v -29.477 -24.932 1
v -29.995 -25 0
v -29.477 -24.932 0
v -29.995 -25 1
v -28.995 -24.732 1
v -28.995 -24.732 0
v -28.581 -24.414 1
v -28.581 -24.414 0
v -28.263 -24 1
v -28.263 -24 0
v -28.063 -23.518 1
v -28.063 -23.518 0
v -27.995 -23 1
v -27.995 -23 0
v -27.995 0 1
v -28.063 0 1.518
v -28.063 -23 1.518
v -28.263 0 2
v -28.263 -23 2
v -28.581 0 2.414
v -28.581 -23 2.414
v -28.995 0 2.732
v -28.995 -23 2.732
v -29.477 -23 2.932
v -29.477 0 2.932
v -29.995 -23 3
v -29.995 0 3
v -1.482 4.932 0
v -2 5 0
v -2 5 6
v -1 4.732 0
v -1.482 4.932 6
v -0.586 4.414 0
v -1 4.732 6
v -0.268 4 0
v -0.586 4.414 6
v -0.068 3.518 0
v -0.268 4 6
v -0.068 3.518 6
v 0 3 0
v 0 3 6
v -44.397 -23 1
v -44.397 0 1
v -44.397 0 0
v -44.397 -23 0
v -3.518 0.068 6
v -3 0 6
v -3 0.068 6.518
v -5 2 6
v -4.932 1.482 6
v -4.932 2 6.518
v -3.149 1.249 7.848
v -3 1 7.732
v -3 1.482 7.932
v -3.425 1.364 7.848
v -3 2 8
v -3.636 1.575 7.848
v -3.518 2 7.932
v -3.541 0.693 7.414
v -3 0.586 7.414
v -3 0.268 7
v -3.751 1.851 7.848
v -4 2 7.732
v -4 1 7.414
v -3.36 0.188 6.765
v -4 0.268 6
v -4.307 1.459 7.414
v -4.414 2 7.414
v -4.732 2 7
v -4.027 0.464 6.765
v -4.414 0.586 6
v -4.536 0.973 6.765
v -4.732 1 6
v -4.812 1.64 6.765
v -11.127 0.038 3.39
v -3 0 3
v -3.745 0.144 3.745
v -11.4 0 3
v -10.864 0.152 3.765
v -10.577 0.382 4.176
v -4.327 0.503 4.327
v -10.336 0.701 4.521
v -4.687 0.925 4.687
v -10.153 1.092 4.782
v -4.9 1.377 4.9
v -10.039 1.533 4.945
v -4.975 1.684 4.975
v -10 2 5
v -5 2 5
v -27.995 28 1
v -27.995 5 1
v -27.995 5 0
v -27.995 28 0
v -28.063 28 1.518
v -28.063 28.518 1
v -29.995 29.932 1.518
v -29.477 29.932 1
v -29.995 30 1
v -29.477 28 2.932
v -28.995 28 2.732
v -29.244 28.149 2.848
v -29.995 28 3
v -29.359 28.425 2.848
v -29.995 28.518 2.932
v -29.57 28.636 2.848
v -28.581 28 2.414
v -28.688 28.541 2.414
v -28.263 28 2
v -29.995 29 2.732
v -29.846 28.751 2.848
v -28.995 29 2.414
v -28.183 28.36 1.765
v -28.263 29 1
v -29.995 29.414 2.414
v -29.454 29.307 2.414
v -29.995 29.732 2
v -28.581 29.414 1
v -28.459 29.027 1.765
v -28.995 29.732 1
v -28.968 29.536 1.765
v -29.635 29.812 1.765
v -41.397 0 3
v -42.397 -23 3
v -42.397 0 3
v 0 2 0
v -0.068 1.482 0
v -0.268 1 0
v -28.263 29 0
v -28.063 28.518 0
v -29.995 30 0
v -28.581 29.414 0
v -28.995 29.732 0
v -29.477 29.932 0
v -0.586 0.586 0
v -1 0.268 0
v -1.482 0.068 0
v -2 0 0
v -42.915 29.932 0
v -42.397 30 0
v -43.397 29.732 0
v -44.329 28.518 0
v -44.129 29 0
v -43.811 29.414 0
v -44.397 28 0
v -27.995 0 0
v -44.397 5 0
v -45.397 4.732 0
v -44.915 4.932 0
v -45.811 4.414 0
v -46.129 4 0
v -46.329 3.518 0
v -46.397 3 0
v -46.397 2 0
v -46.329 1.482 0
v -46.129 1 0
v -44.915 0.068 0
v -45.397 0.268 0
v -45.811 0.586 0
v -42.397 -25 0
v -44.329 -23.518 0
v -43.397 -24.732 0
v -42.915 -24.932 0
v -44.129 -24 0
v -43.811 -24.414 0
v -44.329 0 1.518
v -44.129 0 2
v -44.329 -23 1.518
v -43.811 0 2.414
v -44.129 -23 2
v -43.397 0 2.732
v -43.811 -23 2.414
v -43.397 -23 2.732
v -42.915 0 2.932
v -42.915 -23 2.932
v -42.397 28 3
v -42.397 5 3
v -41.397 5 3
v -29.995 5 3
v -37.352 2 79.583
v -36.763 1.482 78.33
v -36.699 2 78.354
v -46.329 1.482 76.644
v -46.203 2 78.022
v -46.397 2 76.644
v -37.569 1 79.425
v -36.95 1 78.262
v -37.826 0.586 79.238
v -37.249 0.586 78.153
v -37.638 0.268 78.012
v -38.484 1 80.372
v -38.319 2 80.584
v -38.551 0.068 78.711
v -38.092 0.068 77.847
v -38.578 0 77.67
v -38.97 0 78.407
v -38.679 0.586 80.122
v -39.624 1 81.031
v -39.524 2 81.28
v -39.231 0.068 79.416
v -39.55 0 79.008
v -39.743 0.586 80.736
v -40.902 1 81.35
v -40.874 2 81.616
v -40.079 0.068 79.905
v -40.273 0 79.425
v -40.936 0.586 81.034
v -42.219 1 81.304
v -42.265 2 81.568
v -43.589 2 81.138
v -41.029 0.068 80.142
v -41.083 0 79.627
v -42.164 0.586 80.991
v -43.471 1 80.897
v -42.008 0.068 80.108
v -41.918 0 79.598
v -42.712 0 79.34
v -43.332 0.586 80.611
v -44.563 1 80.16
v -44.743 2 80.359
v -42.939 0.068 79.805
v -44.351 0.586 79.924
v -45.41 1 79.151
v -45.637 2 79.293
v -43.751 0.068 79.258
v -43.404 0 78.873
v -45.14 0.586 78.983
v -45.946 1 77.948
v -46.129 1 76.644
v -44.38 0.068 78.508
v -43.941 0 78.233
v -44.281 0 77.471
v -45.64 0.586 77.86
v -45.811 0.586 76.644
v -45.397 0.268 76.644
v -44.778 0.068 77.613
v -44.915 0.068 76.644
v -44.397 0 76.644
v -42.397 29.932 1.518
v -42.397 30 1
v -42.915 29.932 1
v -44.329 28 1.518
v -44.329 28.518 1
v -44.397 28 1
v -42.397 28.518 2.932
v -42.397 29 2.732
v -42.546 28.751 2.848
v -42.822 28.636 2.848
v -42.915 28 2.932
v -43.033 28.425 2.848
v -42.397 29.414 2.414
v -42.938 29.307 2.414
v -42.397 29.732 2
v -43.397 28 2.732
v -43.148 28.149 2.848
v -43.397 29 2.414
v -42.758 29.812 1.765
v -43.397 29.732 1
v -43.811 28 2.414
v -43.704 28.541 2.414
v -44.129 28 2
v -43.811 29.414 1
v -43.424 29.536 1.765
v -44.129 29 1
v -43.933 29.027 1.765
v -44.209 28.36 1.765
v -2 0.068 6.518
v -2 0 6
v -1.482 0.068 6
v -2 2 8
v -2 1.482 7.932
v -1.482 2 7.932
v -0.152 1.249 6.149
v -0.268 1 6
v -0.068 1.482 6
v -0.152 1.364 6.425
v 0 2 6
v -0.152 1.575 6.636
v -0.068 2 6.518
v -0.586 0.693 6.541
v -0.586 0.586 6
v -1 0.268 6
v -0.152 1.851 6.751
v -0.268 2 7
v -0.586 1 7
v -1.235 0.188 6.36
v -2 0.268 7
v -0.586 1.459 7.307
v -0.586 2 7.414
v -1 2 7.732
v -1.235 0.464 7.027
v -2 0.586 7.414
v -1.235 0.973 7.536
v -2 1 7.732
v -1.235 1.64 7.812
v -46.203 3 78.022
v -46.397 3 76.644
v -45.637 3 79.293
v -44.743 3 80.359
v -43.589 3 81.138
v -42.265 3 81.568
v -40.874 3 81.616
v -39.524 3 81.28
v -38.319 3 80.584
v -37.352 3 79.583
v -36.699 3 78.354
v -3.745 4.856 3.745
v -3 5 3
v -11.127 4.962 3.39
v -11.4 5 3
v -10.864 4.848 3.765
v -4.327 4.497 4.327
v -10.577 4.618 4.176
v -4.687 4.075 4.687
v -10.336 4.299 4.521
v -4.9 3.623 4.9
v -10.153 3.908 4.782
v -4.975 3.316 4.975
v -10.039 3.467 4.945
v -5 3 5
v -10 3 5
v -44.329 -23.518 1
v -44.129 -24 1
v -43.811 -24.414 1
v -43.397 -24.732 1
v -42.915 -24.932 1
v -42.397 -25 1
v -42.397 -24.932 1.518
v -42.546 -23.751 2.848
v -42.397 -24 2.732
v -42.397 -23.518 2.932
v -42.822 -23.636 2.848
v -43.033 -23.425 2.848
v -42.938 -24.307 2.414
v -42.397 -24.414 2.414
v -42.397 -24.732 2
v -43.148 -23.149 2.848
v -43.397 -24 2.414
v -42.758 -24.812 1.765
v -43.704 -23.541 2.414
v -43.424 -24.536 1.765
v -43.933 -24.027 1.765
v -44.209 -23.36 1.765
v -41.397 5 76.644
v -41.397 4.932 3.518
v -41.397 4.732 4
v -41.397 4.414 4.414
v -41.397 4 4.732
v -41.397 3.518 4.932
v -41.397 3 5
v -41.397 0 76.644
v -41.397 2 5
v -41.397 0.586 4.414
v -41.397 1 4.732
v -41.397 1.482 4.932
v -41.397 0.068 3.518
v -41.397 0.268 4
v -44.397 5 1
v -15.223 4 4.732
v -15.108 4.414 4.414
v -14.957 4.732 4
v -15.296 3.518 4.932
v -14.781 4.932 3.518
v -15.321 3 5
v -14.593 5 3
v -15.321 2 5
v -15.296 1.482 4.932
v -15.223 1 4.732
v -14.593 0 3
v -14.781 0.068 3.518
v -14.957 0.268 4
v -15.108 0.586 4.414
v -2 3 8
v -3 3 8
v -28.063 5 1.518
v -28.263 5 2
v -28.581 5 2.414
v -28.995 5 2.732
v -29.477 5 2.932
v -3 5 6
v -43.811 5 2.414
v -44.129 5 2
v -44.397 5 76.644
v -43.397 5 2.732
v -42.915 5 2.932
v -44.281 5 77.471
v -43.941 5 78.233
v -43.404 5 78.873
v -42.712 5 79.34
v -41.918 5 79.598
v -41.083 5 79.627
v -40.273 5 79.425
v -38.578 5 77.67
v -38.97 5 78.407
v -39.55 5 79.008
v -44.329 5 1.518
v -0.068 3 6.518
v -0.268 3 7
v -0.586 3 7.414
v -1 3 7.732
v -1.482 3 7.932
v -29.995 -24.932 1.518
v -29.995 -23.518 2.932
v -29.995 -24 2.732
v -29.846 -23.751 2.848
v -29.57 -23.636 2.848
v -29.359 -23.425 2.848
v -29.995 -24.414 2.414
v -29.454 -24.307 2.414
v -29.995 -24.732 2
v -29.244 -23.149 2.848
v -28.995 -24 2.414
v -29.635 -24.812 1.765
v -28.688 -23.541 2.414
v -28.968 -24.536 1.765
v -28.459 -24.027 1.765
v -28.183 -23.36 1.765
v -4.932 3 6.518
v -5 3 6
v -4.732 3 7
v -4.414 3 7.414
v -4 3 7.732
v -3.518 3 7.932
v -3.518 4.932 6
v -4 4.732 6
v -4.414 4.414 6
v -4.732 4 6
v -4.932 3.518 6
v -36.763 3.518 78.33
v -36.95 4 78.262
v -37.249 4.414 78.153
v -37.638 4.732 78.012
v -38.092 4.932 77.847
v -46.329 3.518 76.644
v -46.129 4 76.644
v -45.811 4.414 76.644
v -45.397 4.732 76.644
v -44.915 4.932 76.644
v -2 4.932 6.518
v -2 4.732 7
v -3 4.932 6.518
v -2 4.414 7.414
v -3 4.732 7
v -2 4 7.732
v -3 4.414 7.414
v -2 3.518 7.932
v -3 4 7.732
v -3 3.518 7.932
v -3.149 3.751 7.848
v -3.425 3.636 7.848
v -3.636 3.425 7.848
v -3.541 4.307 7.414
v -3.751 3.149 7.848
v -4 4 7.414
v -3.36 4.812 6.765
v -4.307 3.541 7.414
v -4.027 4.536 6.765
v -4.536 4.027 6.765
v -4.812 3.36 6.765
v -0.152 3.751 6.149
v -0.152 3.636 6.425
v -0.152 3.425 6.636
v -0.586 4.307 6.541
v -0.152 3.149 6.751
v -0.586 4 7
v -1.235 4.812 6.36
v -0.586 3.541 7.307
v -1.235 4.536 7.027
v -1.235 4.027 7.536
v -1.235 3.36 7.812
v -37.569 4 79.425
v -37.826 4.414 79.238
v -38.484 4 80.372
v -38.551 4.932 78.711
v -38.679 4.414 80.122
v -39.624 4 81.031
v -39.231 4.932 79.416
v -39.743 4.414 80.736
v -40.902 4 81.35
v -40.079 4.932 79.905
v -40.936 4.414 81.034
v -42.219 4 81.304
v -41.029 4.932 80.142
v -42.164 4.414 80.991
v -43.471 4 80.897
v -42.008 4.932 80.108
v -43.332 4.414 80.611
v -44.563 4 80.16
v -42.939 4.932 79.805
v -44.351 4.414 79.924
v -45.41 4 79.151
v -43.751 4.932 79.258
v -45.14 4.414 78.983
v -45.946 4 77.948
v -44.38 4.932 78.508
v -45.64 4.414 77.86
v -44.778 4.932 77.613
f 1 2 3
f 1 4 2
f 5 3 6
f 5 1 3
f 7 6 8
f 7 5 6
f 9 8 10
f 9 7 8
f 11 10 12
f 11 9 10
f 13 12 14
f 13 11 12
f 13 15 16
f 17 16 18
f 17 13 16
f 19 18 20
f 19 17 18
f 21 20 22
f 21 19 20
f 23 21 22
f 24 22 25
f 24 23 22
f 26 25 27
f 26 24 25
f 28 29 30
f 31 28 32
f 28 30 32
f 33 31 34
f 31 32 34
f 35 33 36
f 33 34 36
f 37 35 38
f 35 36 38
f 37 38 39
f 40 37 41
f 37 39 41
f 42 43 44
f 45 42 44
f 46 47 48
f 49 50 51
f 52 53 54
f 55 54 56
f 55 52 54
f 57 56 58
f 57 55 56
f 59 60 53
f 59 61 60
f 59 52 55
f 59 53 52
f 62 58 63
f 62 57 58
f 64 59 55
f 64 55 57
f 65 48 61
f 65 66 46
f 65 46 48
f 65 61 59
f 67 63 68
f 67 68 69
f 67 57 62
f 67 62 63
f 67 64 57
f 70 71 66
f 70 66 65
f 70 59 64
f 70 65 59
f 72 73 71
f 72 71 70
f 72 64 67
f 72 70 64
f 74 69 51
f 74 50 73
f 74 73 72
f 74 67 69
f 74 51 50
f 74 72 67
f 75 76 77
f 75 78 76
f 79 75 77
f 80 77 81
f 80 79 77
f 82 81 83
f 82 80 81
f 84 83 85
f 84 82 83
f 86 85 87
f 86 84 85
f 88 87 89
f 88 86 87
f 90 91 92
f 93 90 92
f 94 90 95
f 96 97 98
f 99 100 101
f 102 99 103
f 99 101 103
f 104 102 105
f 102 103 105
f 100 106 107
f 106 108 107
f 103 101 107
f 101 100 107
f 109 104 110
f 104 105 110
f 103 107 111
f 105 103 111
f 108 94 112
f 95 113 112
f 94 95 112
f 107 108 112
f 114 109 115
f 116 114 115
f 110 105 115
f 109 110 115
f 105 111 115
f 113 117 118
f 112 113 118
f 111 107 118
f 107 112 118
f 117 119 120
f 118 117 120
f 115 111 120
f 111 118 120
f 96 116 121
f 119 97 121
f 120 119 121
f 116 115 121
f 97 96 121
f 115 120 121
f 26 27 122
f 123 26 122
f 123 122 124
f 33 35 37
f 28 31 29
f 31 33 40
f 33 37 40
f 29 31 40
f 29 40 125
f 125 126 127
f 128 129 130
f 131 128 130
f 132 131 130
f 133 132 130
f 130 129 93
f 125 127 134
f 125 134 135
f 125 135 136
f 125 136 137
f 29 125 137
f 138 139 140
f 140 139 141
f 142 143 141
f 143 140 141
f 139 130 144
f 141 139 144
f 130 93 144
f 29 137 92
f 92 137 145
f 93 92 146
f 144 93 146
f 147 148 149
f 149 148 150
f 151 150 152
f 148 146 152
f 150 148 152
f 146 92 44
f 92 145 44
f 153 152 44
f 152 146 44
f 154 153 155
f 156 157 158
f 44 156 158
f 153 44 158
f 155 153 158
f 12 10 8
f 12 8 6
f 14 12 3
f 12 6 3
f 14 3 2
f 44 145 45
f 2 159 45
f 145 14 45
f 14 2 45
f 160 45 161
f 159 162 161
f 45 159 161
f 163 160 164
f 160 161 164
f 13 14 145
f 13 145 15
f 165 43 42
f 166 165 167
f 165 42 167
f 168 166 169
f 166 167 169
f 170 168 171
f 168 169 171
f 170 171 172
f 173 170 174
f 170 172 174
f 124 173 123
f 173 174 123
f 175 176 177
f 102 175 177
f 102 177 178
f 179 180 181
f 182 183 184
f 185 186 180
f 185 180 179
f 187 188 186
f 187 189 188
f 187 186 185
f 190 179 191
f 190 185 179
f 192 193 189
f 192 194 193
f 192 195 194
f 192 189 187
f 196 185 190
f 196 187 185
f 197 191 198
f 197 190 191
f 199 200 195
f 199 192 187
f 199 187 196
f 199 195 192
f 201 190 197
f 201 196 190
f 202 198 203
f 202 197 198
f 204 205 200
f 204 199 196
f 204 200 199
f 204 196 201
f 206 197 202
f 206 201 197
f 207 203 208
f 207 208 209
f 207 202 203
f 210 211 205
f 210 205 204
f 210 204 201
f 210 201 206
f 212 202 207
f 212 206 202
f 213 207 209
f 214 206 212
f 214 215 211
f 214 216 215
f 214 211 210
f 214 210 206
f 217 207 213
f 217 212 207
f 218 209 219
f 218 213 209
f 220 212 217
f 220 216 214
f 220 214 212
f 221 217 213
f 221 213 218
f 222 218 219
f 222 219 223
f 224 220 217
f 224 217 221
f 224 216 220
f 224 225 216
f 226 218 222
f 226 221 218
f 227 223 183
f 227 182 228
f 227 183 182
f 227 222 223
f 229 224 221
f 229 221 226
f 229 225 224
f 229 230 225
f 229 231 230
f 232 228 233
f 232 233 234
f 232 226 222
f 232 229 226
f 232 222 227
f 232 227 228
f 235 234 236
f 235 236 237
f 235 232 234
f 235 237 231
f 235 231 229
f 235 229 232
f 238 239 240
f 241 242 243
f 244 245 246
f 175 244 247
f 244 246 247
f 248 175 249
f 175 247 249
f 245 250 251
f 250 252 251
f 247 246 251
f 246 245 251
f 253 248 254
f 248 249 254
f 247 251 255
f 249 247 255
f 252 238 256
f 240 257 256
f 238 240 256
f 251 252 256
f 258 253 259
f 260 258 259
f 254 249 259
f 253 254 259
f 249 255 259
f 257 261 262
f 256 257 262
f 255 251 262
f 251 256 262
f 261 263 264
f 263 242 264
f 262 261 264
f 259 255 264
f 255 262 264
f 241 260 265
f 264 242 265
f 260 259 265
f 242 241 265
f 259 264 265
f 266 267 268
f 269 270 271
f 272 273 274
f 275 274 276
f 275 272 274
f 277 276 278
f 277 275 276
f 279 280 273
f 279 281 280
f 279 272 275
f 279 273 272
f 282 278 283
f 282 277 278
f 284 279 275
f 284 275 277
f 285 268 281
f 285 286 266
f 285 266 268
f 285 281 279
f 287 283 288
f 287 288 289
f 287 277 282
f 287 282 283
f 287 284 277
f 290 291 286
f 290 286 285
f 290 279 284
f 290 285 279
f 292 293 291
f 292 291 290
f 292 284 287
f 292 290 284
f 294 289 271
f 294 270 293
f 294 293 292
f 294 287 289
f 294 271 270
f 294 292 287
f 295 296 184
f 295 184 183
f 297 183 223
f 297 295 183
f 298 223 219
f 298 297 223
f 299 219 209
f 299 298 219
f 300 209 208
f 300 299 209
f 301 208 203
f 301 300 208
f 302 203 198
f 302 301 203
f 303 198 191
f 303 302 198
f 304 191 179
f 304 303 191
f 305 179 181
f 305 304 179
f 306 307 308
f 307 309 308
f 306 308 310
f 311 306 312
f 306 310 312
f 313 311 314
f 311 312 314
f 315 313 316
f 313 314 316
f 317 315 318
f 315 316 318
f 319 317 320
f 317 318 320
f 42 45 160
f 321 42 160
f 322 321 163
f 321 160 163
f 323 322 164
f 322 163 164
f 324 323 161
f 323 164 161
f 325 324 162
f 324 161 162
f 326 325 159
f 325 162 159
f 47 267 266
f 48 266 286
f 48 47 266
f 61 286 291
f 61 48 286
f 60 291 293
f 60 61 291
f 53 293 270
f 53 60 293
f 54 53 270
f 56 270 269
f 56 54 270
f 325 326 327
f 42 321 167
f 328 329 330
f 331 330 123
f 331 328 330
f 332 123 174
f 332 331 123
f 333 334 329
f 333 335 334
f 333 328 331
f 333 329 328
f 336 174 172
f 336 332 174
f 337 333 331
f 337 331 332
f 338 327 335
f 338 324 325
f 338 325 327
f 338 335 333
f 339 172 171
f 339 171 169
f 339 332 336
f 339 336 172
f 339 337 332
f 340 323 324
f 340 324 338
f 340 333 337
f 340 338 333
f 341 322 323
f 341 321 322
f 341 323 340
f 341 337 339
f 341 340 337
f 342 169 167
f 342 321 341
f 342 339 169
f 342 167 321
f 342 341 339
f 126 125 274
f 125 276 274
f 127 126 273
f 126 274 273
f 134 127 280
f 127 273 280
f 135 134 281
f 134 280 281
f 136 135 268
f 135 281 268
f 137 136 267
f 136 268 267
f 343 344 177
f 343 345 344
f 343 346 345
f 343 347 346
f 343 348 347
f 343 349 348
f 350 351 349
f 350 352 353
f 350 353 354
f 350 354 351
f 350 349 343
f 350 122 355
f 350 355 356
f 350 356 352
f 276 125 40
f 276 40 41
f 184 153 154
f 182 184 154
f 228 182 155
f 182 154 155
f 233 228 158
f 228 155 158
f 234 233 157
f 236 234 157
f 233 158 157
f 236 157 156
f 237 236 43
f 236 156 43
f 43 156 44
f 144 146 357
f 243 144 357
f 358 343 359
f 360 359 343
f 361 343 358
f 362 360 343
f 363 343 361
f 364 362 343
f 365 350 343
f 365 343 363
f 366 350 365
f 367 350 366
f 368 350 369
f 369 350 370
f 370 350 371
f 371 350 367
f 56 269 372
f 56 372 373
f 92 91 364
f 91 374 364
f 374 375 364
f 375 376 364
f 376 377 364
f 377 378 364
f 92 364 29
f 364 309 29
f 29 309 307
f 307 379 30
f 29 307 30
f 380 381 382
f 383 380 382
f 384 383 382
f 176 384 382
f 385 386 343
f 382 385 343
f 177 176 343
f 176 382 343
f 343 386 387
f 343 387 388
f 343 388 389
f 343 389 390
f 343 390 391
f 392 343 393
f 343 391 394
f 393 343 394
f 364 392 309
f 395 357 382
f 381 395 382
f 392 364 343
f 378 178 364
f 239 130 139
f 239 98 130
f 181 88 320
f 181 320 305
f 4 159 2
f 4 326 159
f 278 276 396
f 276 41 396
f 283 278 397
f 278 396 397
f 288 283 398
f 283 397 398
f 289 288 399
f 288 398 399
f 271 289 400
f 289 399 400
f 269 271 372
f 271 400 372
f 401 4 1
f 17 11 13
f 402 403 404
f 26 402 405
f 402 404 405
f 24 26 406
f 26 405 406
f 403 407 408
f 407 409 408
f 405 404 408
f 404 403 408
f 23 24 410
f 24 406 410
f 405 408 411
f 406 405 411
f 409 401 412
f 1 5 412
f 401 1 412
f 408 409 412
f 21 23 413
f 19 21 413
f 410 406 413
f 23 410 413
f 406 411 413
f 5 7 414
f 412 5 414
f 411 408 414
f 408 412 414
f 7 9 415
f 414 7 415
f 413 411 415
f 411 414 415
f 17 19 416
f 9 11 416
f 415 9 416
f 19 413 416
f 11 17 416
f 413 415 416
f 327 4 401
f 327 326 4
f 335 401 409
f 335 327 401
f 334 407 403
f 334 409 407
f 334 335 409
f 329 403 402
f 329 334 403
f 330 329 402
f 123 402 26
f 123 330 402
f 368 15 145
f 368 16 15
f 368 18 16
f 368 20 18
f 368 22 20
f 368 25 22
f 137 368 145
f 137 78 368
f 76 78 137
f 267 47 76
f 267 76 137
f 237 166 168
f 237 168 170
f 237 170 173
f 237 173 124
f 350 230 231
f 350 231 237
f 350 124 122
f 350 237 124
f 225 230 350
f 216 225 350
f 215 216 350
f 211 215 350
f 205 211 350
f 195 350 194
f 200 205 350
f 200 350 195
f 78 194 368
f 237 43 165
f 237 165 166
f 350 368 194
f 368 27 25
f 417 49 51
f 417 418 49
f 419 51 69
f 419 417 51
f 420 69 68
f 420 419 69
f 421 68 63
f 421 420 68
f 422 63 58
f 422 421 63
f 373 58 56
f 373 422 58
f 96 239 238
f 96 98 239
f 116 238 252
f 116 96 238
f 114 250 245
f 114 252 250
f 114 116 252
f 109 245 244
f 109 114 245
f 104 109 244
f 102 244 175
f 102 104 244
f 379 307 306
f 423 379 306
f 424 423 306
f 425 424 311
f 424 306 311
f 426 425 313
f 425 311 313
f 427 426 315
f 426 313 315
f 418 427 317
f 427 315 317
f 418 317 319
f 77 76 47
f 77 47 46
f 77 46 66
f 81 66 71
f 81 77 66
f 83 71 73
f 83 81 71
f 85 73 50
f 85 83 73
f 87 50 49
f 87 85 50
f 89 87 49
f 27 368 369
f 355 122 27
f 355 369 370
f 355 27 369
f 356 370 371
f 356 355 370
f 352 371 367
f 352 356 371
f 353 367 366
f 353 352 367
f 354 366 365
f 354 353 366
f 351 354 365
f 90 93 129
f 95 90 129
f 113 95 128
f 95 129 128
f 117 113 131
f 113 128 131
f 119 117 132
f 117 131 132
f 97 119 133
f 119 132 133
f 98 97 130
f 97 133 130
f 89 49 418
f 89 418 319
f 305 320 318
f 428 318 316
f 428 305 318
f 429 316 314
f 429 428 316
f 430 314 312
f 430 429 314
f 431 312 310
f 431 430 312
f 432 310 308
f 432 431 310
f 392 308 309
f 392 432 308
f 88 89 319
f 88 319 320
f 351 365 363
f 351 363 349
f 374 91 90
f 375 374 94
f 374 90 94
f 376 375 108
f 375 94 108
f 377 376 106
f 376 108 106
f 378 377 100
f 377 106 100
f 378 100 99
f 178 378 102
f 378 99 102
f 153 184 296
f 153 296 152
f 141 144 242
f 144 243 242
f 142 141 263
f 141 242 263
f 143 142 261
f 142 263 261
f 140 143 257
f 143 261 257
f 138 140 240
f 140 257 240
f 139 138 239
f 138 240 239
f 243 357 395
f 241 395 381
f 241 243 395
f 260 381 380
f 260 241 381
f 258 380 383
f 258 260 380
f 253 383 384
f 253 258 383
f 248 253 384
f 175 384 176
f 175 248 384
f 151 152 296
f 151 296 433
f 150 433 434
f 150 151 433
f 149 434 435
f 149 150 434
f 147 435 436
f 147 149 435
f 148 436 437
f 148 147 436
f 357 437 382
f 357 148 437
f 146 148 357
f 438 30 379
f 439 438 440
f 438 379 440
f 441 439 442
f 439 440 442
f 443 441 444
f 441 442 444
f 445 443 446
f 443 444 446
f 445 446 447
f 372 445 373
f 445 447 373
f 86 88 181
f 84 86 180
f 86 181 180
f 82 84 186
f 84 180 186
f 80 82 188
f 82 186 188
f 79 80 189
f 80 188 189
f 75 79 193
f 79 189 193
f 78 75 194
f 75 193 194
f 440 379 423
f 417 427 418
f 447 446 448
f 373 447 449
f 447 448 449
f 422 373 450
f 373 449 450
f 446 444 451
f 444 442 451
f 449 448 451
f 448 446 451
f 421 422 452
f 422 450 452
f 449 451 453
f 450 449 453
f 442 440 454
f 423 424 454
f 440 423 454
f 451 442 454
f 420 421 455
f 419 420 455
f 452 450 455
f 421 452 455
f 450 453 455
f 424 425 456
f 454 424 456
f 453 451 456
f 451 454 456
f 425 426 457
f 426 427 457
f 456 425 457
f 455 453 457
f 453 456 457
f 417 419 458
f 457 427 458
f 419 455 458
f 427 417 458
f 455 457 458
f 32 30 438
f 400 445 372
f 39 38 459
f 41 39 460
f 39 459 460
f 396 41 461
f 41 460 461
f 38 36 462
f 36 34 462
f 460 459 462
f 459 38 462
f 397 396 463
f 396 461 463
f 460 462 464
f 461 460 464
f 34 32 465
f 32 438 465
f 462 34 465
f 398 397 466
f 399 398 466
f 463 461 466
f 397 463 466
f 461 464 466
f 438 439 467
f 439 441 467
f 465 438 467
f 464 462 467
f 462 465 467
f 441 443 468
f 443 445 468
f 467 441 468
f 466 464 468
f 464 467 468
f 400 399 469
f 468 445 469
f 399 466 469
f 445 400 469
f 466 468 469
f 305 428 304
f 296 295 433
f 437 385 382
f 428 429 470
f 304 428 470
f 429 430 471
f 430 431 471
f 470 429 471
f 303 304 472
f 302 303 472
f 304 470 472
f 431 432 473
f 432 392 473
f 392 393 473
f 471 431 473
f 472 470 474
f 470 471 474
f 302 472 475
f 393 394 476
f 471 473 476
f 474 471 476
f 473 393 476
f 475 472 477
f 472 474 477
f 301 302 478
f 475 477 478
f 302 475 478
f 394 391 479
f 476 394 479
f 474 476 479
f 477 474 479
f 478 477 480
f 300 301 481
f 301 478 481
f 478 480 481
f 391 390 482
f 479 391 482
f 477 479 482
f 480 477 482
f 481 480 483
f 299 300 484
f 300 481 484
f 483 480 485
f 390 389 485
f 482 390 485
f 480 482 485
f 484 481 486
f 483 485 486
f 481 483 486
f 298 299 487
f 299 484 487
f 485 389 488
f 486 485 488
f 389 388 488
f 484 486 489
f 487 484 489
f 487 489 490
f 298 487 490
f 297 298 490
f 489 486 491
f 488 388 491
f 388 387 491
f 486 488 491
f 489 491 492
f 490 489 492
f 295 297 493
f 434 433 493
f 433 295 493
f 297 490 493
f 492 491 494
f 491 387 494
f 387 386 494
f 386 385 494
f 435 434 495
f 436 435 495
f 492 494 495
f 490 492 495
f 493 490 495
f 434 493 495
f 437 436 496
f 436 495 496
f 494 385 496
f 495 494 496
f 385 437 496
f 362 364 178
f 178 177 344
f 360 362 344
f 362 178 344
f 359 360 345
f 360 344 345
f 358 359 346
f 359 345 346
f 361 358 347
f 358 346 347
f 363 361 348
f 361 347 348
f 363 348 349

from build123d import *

# Parameters (mm, degrees)
F1_DEPTH    = 5
F3_W        = 10
F3_H        = 180
F4_DEPTH    = 5.001
F5_T1_DEPTH = 146.7820454904
F6_R        = 2
F11_DEPTH   = 25
F13_DEPTH   = 25
F14_R       = 2


# Not quite as in the source:
# - a fillet or chamfer that OpenCascade refuses, or shapes differently, is made with other operations: its cross-section is extruded or revolved along the edge and cut away or added
# - two fillets or chamfers of one size are made in one step


with BuildPart() as f1:
    # F0 (on Front) → F1 (new body)
    with BuildSketch(Plane.XZ):
        Polygon((-46.3970234266, 0), (0, 0), (0, 8), (-5, 8), (-5, 5), (-10, 5), (-46.3970234266, 105), align=None)
        Polygon((-41.3970234266, 5), (-41.3970234266, 76.6435909019), (-15.3208888624, 5), align=None, mode=Mode.SUBTRACT)
    extrude(amount=-F1_DEPTH)

    # F3 (on face) → F4 (cut, through all)
    with BuildSketch(Plane.XY.offset(5)):
        with Locations((-5, 95)):
            Rectangle(F3_W, F3_H)
    extrude(amount=-F4_DEPTH, mode=Mode.SUBTRACT)

    # F5: fillet of radius 5 on 1 edges, made by hand

    # F5_s2 → F5_t1 (cut)
    with BuildSketch(Plane.XZ.offset(-75.8910227452)):
        with BuildLine():
            ThreePointArc((-46.3970234266, 76.6435909019), (-42.265264315, 81.567629667), (-36.6985603227, 78.3536916185))
            Line((-36.6985603227, 78.3536916185), (-46.3970234266, 105))
            Line((-46.3970234266, 105), (-46.3970234266, 76.6435909019))
        make_face()
    extrude(amount=F5_T1_DEPTH, mode=Mode.SUBTRACT)

    # F6
    f6_edges = [f1.edges().sort_by_distance(p)[0] for p in [
        (-46.397023, 0, 38.321795),
        (-46.397023, 5, 38.321795),
        (-42.265264, 0, 81.56763),
        (-23.34928, 0, 41.676846),
        (-7.5, 0, 5),
        (-5, 0, 6.5),
        (-2.5, 0, 8),
        (0, 0, 4),
        (-28.358956, 0, 5),
        (-7.5, 5, 5),
        (-5, 5, 6.5),
        (-2.5, 5, 8),
        (0, 5, 4),
        (-42.265264, 5, 81.56763),
        (-23.34928, 5, 41.676846),
        (-28.358956, 5, 5),
        (-5, 2.5, 8),
        (0, 2.5, 8),
    ]]
    fillet(f6_edges, radius=F6_R)

    # F10 (on face) → F11 (join)
    with BuildSketch(Plane.XZ):
        Polygon((-44.3970234266, 3), (-44.3970234266, 0), (-27.9949859102, 0), (-27.9949859102, 3), (-41.3970234266, 3), align=None)
    extrude(amount=F11_DEPTH)

    # F12 (on face) → F13 (join)
    with BuildSketch(Plane(origin=(0, 5, 0), x_dir=(-1, 0, 0), z_dir=(0, 1, 0))):
        Polygon((27.9949859102, 0), (44.3970234266, 0), (44.3970234266, 3), (41.3970234266, 3), (27.9949859102, 3), align=None)
    extrude(amount=F13_DEPTH)

    # F14
    f14_edges = [f1.edges().sort_by_distance(p)[0] for p in [
        (-27.994986, -25, 1.5),
        (-44.397023, -25, 1.5),
        (-36.196005, -25, 3),
        (-27.994986, -12.5, 3),
        (-44.397023, -12.5, 3),
        (-27.994986, 30, 1.5),
        (-44.397023, 30, 1.5),
        (-27.994986, 17.5, 3),
        (-36.196005, 30, 3),
        (-44.397023, 17.5, 3),
    ]]
    fillet(f14_edges, radius=F14_R)


solid = f1.part
